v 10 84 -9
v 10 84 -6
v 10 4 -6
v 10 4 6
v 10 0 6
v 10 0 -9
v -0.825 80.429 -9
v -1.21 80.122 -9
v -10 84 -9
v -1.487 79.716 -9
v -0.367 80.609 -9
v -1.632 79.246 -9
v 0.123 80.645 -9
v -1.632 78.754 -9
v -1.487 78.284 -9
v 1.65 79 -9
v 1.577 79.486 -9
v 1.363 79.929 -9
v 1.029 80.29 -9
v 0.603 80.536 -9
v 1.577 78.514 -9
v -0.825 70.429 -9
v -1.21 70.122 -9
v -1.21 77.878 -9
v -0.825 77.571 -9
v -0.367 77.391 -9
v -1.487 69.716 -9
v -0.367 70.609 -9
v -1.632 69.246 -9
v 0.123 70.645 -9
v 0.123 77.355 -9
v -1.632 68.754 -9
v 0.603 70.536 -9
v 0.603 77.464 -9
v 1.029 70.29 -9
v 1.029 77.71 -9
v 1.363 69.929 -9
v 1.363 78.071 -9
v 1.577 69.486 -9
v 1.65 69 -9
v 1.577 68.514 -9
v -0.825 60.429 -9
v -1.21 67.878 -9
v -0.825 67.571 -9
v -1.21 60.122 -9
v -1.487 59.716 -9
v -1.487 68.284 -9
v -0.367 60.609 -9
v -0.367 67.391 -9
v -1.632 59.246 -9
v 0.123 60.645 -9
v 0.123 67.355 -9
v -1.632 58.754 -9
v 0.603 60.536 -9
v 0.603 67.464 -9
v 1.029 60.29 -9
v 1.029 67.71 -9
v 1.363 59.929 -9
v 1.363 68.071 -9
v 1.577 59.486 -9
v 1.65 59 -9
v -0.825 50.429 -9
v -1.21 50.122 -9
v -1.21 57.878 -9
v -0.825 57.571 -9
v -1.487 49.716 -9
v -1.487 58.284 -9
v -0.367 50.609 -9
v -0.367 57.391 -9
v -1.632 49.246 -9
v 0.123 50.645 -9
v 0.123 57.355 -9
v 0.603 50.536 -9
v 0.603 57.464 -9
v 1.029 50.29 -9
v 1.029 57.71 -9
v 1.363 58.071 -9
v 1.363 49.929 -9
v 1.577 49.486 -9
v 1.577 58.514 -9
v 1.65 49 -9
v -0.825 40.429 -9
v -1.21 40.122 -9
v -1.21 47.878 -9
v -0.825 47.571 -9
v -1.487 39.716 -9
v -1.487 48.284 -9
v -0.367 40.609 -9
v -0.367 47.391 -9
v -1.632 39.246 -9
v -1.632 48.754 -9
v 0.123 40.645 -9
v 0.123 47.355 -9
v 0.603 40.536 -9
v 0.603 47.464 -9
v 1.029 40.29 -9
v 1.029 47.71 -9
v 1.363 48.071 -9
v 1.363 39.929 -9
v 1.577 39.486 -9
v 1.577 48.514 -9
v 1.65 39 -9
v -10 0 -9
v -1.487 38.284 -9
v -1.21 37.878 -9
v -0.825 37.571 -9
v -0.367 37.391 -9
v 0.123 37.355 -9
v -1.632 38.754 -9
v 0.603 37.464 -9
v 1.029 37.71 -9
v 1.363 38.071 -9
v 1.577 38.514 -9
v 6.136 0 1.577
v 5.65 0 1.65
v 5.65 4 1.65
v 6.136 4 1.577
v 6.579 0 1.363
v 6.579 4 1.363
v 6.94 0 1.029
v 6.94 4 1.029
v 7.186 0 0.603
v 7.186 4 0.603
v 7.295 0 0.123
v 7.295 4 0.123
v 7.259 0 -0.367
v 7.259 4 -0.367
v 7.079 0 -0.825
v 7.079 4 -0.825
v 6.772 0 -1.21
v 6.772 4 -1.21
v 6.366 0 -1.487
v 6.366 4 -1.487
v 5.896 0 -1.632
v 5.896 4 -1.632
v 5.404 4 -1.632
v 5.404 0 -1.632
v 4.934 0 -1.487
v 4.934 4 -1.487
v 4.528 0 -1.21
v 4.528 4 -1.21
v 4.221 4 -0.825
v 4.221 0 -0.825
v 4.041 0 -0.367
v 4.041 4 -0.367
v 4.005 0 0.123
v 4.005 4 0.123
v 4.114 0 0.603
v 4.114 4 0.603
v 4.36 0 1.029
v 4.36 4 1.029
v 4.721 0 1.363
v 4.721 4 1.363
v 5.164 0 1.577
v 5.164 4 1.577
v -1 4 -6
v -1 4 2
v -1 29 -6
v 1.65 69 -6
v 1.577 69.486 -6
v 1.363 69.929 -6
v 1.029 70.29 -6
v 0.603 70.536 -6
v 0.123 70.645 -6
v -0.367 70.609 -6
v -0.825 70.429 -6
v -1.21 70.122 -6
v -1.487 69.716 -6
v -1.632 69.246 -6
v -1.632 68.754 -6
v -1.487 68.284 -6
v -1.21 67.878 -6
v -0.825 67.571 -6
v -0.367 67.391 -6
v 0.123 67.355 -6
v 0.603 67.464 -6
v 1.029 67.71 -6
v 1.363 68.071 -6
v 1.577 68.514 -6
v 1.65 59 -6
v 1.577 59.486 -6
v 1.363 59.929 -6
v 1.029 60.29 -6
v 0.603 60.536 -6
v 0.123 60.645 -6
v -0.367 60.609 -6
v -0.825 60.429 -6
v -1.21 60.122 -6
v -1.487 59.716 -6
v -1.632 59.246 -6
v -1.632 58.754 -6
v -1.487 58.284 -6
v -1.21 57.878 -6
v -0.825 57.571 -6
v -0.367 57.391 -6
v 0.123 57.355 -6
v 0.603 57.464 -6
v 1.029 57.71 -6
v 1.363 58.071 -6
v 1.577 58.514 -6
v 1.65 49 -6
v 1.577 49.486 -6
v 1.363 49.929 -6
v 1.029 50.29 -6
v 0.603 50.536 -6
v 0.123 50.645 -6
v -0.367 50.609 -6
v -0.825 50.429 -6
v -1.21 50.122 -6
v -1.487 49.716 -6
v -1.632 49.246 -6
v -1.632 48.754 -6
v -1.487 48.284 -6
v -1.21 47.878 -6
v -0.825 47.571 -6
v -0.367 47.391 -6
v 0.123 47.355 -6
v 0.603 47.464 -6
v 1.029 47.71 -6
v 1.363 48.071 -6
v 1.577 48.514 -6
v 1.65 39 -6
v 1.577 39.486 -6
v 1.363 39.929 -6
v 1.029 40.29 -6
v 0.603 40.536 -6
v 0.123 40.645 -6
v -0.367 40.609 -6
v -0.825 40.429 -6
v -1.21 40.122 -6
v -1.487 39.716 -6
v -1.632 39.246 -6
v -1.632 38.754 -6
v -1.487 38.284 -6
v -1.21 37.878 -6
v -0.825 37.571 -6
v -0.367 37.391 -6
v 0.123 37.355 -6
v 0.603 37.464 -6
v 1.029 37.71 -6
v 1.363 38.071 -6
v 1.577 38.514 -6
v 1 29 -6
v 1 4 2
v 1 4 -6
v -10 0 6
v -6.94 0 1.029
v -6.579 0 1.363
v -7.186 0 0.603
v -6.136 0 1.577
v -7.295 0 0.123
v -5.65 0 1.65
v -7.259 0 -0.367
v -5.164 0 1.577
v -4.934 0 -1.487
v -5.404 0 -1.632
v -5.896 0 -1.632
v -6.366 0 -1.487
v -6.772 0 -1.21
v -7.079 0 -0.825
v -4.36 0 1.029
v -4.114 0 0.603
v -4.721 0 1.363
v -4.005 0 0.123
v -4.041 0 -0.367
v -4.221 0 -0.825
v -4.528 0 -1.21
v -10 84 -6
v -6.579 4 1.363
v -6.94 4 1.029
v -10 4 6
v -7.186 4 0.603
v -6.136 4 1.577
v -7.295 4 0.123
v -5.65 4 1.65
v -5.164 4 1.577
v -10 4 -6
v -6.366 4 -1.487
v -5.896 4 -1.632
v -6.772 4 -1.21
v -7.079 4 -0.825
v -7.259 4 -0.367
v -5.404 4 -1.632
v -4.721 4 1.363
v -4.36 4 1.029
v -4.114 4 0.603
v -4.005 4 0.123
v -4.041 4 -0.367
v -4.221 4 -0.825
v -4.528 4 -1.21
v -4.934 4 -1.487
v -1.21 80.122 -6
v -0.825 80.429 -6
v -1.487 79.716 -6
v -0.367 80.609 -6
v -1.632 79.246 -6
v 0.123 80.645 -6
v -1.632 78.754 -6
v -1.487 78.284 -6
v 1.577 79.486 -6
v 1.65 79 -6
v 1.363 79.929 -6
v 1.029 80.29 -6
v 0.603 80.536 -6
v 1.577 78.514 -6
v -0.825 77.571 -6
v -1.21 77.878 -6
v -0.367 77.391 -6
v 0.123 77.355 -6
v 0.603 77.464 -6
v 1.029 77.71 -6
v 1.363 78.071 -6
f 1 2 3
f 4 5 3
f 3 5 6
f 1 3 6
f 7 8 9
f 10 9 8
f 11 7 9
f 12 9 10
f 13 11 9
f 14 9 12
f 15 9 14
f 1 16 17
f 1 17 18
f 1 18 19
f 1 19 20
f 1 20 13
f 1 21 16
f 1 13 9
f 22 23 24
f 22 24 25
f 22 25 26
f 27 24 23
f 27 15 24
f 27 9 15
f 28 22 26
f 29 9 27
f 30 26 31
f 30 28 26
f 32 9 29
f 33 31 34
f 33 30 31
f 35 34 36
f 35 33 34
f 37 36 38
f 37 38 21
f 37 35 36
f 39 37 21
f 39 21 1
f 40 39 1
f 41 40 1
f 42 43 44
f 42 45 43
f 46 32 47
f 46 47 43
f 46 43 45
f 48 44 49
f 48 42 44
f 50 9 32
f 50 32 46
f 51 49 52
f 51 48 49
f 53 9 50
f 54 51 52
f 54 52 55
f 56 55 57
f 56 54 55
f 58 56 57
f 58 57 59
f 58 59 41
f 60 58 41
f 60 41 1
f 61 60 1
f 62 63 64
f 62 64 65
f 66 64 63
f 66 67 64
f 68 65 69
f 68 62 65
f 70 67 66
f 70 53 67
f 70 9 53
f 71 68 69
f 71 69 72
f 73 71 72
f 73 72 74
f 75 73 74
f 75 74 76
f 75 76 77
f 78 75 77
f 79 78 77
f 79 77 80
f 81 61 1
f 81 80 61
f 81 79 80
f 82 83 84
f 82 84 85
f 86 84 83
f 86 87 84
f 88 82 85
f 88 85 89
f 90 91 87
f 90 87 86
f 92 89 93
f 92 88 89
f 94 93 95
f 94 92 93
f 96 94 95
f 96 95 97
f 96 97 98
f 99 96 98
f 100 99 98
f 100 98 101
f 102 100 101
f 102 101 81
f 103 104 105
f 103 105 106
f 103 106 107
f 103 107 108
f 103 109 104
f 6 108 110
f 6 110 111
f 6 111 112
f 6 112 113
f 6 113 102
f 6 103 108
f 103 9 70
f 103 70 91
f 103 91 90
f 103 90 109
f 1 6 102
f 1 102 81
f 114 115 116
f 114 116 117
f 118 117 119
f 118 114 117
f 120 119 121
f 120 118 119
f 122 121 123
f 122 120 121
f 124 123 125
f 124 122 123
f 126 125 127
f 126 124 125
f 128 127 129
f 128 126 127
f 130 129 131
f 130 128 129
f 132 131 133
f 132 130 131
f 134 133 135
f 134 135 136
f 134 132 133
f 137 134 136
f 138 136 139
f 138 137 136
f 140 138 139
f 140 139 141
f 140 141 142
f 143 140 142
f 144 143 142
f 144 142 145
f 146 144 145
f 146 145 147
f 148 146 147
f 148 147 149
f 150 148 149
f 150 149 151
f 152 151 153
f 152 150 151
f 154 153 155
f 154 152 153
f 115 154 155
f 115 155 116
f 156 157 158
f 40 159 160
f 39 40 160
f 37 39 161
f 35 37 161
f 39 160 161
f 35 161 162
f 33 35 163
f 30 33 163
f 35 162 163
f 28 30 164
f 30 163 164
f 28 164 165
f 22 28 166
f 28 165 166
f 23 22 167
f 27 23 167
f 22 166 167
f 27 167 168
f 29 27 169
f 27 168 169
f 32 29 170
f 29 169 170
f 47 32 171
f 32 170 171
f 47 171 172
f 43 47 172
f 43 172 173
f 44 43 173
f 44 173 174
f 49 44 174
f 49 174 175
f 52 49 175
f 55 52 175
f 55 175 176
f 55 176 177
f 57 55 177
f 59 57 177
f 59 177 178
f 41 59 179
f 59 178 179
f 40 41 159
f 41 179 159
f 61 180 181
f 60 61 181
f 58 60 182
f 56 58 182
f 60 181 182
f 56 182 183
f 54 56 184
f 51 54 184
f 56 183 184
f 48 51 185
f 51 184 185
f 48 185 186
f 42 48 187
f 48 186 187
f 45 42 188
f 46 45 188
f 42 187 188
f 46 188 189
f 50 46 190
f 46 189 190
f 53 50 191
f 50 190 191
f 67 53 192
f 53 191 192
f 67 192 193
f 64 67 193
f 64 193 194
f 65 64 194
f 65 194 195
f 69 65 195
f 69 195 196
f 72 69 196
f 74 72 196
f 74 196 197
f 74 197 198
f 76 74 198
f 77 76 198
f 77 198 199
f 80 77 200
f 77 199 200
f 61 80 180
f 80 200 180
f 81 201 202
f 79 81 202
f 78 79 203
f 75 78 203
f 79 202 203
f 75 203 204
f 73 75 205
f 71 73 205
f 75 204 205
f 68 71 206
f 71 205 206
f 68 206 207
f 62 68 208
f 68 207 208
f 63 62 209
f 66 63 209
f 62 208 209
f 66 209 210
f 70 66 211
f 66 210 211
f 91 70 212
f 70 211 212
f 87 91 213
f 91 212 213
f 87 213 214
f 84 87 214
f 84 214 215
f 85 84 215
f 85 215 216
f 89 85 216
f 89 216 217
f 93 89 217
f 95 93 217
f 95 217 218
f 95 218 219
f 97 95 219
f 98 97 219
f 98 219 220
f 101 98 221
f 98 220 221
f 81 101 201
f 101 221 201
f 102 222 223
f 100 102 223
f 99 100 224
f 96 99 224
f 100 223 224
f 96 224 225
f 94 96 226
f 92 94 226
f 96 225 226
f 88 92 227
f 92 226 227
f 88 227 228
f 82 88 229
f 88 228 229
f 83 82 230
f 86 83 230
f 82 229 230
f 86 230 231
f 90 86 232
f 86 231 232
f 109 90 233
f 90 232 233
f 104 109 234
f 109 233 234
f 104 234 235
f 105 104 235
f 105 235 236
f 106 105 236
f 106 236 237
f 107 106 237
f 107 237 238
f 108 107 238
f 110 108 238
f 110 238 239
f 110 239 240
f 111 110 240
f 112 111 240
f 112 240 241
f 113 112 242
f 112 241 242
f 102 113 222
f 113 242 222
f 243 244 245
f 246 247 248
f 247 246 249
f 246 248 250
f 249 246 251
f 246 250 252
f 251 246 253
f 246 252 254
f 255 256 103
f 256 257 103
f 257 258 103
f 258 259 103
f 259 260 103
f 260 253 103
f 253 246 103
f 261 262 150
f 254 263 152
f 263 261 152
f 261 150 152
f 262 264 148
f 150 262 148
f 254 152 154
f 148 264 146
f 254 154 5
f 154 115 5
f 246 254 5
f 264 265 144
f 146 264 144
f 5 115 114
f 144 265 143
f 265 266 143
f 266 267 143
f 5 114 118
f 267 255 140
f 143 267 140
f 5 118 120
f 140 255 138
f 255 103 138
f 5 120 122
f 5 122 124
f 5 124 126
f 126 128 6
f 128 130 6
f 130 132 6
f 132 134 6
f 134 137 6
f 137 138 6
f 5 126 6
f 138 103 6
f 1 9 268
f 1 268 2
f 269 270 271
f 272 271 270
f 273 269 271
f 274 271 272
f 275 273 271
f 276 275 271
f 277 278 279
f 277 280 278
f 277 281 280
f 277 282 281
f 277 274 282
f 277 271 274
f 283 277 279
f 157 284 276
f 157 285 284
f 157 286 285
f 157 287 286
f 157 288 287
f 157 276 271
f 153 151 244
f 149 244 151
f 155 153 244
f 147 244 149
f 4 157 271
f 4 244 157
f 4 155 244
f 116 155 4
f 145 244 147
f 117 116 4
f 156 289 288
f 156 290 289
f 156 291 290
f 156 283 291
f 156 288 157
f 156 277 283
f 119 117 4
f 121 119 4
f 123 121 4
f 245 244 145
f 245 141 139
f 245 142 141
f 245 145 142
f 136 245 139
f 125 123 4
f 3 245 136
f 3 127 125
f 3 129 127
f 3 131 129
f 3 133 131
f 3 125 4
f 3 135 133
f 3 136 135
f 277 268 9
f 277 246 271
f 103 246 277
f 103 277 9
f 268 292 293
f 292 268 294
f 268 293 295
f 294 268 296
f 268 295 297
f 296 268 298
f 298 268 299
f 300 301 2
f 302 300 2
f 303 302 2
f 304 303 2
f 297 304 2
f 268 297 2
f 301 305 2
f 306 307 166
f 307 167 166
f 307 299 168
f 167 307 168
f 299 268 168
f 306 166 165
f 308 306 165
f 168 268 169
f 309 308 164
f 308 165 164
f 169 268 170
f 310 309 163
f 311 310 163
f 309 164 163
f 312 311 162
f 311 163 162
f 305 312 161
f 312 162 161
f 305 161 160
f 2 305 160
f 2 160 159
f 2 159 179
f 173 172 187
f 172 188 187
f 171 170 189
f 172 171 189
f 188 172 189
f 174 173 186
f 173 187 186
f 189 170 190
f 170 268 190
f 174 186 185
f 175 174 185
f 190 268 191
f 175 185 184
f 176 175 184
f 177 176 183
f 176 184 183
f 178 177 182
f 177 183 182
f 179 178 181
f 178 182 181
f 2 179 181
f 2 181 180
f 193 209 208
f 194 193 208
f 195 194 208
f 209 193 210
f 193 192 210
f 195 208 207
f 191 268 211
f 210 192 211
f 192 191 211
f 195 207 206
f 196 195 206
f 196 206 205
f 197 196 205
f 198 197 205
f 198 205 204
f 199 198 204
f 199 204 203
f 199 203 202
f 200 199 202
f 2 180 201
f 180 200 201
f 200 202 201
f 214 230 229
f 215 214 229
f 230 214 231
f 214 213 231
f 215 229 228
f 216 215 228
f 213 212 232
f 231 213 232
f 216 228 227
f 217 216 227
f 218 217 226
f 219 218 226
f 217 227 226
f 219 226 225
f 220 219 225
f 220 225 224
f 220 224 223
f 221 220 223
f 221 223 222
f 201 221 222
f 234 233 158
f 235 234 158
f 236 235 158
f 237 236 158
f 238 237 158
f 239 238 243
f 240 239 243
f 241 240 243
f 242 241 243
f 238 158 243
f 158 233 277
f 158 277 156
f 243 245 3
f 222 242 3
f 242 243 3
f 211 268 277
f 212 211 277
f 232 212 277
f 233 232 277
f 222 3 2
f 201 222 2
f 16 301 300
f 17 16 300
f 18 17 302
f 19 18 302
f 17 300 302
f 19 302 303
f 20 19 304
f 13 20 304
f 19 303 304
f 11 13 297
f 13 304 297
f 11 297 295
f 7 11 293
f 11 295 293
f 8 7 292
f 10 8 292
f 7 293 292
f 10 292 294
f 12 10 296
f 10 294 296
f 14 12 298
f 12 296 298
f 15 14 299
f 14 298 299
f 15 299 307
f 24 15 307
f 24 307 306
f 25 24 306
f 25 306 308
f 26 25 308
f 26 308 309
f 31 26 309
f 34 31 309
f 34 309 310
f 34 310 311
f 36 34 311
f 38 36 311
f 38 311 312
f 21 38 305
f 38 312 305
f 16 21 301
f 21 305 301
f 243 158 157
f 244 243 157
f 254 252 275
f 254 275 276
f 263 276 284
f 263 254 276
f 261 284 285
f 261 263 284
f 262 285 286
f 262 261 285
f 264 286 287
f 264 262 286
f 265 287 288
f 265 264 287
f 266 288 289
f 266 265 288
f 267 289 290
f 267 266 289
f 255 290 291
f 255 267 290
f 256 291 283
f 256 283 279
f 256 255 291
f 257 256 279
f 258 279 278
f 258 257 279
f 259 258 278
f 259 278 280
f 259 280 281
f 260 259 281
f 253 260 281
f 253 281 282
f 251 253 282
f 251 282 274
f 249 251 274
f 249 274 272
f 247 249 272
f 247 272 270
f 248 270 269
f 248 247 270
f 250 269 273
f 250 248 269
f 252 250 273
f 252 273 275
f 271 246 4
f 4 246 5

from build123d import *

# Parameters (mm, degrees)
SKETCH_1_W           = 20
SKETCH_1_H           = 12
SKETCH_1_R           = 1.65
EXTRUDE_1_DEPTH      = 4
SKETCH_2_W           = 20
SKETCH_2_H           = 3
EXTRUDE_2_DEPTH      = 84
EXTRUDE_3_DEPTH      = 1
EXTRUDE_3_DEPTH_BACK = 1
SKETCH_4_R           = 1.65
CUT_EXTRUDE_1_DEPTH  = 3


with BuildPart() as part:
    # 草图1 → 凸台-拉伸1 (new body)
    with BuildSketch(Plane(origin=(0, 0, 0), x_dir=(1, 0, 0), z_dir=(0, 1, 0))):
        Rectangle(SKETCH_1_W, SKETCH_1_H)
        with Locations(Location((-5.65, 0, 0), (0, 0, 270))):
            Circle(SKETCH_1_R, mode=Mode.SUBTRACT)
        with Locations(Location((5.65, 0, 0), (0, 0, 270))):
            Circle(SKETCH_1_R, mode=Mode.SUBTRACT)
    extrude(amount=EXTRUDE_1_DEPTH)

    # 草图2 → 凸台-拉伸2 (add)
    with BuildSketch(Plane(origin=(0, 0, 0), x_dir=(1, 0, 0), z_dir=(0, 1, 0))):
        with Locations((0, 7.5)):
            Rectangle(SKETCH_2_W, SKETCH_2_H)
    extrude(amount=EXTRUDE_2_DEPTH)

    # 草图3 → 凸台-拉伸3 (add, two sides: drawn at the far end of the back side and taken through both)
    with BuildSketch(Plane(origin=(0, 0, 0), x_dir=(0, 0, -1), z_dir=(1, 0, 0)).offset(-EXTRUDE_3_DEPTH_BACK)):
        Polygon((-2, 4), (6, 4), (6, 29), align=None)
    extrude(amount=EXTRUDE_3_DEPTH + EXTRUDE_3_DEPTH_BACK)

    # 草图4 → 切除-拉伸1 (cut)
    with BuildSketch(Plane.XY.offset(-6)):
        with Locations((0, 39)):
            Circle(SKETCH_4_R)
        with Locations((0, 49)):
            Circle(SKETCH_4_R)
        with Locations((0, 59)):
            Circle(SKETCH_4_R)
        with Locations((0, 69)):
            Circle(SKETCH_4_R)
        with Locations((0, 79)):
            Circle(SKETCH_4_R)
    extrude(amount=-CUT_EXTRUDE_1_DEPTH, mode=Mode.SUBTRACT)


solid = part.part
